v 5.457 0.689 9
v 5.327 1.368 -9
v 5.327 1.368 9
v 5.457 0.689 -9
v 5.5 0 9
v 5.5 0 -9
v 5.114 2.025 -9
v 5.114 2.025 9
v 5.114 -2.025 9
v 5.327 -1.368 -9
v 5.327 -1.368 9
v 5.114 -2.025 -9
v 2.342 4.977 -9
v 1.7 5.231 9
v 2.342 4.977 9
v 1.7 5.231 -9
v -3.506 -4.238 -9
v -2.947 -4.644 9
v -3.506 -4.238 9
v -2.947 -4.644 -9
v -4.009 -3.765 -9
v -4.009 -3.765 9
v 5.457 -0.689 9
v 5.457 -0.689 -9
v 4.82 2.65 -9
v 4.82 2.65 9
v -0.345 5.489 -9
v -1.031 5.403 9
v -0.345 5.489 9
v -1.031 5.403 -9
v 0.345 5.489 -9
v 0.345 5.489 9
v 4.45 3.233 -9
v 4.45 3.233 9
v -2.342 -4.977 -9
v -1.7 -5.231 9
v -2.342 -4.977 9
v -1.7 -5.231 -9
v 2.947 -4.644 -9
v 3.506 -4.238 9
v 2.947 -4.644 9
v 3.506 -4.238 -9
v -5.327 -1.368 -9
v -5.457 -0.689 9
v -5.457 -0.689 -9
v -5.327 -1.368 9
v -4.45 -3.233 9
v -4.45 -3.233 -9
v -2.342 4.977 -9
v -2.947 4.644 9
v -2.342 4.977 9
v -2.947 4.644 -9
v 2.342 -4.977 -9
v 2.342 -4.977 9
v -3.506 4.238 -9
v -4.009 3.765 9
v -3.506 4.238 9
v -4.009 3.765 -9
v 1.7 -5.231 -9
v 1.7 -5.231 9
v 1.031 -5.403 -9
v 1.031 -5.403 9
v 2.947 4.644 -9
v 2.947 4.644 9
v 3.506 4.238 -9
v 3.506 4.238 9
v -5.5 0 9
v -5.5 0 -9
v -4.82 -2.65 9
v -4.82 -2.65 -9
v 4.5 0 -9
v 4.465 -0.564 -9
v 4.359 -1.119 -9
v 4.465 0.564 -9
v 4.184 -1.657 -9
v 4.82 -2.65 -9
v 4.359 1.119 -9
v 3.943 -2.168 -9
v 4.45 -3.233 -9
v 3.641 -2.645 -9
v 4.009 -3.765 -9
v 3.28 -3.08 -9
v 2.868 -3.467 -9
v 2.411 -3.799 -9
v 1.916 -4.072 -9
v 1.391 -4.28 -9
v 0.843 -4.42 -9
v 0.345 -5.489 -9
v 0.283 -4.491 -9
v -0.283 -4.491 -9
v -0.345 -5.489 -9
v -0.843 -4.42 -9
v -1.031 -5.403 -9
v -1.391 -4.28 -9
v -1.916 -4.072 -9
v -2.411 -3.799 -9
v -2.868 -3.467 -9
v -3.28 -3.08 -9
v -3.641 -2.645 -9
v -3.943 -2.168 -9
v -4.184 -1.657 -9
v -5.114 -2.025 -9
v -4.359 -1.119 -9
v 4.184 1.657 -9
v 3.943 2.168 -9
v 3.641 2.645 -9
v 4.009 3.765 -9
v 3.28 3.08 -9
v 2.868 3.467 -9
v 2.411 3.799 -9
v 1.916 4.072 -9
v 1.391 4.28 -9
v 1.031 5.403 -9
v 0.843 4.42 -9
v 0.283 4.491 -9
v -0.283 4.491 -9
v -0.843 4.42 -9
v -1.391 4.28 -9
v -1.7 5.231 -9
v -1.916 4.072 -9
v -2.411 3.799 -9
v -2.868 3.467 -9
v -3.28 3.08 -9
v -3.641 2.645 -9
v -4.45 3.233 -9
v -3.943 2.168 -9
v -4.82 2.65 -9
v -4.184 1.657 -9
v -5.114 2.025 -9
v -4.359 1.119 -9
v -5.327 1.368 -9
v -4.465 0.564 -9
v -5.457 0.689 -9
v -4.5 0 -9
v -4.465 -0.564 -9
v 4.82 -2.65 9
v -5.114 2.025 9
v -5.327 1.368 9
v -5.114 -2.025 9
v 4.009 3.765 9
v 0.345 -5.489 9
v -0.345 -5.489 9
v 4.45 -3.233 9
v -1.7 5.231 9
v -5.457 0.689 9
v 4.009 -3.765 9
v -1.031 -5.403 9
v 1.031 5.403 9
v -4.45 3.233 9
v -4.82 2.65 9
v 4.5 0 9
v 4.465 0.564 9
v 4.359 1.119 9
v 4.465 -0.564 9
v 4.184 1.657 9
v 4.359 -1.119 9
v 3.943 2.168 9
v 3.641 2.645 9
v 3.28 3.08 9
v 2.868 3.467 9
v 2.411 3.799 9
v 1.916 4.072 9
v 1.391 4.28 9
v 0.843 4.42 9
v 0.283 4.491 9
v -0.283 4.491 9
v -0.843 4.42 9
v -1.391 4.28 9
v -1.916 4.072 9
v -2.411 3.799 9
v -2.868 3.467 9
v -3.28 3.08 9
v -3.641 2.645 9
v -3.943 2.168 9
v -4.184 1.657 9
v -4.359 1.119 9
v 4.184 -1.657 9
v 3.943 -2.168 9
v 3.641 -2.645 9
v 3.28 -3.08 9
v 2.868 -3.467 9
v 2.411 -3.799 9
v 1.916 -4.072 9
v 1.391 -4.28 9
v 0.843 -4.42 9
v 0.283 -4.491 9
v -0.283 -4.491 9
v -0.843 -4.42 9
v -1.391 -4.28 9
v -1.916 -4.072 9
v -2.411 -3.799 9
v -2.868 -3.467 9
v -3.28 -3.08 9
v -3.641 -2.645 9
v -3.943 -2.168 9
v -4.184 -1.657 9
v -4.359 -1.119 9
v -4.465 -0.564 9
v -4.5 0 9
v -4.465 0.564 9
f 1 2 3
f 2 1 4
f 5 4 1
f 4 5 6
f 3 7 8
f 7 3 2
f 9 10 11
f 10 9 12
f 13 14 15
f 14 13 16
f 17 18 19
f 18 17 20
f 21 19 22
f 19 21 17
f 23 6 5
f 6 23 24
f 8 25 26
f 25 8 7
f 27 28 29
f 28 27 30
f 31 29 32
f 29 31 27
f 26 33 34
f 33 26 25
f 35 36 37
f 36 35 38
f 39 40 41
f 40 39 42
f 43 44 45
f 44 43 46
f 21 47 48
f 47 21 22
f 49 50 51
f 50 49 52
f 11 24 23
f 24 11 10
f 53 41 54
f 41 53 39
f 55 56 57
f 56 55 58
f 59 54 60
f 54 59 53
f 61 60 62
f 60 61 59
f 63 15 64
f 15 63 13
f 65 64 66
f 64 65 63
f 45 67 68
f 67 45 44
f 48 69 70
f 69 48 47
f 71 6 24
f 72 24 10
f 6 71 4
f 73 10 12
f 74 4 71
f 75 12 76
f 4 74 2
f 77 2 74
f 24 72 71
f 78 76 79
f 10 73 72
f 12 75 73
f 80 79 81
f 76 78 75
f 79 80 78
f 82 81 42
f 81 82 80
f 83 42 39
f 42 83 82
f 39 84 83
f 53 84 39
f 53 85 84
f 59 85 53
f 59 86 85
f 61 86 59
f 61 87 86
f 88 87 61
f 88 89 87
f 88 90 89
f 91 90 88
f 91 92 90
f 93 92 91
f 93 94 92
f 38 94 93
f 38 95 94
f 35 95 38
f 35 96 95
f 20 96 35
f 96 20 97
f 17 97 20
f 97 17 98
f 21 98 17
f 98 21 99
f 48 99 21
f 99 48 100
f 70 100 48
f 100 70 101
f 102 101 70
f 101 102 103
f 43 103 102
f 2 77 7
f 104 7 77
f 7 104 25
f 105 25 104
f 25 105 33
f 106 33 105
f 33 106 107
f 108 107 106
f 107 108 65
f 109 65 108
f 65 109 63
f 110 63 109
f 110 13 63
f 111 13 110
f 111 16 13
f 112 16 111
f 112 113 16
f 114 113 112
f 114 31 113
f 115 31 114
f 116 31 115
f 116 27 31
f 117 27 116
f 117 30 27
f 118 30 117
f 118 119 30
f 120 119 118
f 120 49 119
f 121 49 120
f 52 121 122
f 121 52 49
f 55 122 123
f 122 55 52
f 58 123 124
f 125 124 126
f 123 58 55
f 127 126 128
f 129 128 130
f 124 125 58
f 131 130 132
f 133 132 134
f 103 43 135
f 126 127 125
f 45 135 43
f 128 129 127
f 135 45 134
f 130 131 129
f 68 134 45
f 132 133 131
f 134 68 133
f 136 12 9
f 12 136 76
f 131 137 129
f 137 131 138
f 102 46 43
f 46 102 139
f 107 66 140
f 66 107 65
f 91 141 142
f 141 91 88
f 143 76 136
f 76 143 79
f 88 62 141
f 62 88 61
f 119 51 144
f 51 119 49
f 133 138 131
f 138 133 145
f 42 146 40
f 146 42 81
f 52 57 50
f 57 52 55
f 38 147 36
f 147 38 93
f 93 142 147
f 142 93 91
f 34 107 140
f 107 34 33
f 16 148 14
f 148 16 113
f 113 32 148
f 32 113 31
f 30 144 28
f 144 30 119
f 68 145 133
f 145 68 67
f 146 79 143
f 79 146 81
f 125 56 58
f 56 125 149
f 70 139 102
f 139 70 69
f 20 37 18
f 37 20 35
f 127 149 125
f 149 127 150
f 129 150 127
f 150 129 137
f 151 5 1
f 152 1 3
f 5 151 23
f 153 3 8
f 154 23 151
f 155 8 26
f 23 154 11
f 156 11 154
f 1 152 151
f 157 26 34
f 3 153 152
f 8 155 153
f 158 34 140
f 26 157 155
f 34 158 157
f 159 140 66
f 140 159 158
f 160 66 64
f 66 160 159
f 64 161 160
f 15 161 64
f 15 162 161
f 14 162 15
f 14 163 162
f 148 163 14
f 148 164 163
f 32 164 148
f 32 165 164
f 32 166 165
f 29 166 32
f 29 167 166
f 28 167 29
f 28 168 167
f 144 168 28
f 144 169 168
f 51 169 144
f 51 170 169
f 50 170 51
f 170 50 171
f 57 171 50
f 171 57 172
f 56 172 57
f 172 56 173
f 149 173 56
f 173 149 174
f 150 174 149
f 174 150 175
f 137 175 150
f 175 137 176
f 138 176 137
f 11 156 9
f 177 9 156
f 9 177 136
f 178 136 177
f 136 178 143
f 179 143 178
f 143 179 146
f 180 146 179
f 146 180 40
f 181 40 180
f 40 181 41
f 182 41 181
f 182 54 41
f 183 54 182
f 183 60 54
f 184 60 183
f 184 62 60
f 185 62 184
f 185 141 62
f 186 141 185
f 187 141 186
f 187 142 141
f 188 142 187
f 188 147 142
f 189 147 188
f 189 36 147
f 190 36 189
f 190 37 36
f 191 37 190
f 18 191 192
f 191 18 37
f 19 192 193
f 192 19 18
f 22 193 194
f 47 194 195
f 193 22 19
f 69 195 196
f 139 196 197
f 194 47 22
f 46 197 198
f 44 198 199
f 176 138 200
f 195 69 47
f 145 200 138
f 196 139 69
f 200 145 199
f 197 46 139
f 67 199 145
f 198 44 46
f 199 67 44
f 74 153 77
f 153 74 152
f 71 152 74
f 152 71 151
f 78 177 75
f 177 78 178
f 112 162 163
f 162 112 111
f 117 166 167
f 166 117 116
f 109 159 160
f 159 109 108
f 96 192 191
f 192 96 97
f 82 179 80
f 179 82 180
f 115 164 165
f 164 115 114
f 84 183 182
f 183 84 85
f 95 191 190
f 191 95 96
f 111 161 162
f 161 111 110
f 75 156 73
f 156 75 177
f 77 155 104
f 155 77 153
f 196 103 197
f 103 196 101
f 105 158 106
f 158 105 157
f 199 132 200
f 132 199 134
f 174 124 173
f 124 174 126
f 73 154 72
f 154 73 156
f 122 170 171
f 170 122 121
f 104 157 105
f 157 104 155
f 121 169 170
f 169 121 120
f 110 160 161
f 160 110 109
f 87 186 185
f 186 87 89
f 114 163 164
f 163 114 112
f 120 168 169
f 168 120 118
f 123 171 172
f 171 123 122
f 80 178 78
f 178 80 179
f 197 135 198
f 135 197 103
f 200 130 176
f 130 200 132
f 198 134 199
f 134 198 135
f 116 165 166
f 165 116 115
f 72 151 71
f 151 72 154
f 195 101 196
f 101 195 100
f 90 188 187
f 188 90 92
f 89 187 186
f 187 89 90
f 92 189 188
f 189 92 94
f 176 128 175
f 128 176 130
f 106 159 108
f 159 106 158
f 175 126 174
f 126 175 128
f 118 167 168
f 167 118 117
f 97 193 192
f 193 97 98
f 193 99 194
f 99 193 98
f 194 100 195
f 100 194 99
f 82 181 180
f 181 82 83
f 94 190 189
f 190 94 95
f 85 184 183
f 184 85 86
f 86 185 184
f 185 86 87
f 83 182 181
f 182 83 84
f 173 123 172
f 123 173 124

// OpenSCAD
$fn = 50;


difference() {
	union() {
		translate(v = [0, 0, -9.0000000000]) {
			cylinder(h = 18, r = 5.5000000000);
		}
	}
	union() {
		translate(v = [0, 0, -100.0000000000]) {
			cylinder(h = 200, r = 4.5000000000);
		}
	}
}
